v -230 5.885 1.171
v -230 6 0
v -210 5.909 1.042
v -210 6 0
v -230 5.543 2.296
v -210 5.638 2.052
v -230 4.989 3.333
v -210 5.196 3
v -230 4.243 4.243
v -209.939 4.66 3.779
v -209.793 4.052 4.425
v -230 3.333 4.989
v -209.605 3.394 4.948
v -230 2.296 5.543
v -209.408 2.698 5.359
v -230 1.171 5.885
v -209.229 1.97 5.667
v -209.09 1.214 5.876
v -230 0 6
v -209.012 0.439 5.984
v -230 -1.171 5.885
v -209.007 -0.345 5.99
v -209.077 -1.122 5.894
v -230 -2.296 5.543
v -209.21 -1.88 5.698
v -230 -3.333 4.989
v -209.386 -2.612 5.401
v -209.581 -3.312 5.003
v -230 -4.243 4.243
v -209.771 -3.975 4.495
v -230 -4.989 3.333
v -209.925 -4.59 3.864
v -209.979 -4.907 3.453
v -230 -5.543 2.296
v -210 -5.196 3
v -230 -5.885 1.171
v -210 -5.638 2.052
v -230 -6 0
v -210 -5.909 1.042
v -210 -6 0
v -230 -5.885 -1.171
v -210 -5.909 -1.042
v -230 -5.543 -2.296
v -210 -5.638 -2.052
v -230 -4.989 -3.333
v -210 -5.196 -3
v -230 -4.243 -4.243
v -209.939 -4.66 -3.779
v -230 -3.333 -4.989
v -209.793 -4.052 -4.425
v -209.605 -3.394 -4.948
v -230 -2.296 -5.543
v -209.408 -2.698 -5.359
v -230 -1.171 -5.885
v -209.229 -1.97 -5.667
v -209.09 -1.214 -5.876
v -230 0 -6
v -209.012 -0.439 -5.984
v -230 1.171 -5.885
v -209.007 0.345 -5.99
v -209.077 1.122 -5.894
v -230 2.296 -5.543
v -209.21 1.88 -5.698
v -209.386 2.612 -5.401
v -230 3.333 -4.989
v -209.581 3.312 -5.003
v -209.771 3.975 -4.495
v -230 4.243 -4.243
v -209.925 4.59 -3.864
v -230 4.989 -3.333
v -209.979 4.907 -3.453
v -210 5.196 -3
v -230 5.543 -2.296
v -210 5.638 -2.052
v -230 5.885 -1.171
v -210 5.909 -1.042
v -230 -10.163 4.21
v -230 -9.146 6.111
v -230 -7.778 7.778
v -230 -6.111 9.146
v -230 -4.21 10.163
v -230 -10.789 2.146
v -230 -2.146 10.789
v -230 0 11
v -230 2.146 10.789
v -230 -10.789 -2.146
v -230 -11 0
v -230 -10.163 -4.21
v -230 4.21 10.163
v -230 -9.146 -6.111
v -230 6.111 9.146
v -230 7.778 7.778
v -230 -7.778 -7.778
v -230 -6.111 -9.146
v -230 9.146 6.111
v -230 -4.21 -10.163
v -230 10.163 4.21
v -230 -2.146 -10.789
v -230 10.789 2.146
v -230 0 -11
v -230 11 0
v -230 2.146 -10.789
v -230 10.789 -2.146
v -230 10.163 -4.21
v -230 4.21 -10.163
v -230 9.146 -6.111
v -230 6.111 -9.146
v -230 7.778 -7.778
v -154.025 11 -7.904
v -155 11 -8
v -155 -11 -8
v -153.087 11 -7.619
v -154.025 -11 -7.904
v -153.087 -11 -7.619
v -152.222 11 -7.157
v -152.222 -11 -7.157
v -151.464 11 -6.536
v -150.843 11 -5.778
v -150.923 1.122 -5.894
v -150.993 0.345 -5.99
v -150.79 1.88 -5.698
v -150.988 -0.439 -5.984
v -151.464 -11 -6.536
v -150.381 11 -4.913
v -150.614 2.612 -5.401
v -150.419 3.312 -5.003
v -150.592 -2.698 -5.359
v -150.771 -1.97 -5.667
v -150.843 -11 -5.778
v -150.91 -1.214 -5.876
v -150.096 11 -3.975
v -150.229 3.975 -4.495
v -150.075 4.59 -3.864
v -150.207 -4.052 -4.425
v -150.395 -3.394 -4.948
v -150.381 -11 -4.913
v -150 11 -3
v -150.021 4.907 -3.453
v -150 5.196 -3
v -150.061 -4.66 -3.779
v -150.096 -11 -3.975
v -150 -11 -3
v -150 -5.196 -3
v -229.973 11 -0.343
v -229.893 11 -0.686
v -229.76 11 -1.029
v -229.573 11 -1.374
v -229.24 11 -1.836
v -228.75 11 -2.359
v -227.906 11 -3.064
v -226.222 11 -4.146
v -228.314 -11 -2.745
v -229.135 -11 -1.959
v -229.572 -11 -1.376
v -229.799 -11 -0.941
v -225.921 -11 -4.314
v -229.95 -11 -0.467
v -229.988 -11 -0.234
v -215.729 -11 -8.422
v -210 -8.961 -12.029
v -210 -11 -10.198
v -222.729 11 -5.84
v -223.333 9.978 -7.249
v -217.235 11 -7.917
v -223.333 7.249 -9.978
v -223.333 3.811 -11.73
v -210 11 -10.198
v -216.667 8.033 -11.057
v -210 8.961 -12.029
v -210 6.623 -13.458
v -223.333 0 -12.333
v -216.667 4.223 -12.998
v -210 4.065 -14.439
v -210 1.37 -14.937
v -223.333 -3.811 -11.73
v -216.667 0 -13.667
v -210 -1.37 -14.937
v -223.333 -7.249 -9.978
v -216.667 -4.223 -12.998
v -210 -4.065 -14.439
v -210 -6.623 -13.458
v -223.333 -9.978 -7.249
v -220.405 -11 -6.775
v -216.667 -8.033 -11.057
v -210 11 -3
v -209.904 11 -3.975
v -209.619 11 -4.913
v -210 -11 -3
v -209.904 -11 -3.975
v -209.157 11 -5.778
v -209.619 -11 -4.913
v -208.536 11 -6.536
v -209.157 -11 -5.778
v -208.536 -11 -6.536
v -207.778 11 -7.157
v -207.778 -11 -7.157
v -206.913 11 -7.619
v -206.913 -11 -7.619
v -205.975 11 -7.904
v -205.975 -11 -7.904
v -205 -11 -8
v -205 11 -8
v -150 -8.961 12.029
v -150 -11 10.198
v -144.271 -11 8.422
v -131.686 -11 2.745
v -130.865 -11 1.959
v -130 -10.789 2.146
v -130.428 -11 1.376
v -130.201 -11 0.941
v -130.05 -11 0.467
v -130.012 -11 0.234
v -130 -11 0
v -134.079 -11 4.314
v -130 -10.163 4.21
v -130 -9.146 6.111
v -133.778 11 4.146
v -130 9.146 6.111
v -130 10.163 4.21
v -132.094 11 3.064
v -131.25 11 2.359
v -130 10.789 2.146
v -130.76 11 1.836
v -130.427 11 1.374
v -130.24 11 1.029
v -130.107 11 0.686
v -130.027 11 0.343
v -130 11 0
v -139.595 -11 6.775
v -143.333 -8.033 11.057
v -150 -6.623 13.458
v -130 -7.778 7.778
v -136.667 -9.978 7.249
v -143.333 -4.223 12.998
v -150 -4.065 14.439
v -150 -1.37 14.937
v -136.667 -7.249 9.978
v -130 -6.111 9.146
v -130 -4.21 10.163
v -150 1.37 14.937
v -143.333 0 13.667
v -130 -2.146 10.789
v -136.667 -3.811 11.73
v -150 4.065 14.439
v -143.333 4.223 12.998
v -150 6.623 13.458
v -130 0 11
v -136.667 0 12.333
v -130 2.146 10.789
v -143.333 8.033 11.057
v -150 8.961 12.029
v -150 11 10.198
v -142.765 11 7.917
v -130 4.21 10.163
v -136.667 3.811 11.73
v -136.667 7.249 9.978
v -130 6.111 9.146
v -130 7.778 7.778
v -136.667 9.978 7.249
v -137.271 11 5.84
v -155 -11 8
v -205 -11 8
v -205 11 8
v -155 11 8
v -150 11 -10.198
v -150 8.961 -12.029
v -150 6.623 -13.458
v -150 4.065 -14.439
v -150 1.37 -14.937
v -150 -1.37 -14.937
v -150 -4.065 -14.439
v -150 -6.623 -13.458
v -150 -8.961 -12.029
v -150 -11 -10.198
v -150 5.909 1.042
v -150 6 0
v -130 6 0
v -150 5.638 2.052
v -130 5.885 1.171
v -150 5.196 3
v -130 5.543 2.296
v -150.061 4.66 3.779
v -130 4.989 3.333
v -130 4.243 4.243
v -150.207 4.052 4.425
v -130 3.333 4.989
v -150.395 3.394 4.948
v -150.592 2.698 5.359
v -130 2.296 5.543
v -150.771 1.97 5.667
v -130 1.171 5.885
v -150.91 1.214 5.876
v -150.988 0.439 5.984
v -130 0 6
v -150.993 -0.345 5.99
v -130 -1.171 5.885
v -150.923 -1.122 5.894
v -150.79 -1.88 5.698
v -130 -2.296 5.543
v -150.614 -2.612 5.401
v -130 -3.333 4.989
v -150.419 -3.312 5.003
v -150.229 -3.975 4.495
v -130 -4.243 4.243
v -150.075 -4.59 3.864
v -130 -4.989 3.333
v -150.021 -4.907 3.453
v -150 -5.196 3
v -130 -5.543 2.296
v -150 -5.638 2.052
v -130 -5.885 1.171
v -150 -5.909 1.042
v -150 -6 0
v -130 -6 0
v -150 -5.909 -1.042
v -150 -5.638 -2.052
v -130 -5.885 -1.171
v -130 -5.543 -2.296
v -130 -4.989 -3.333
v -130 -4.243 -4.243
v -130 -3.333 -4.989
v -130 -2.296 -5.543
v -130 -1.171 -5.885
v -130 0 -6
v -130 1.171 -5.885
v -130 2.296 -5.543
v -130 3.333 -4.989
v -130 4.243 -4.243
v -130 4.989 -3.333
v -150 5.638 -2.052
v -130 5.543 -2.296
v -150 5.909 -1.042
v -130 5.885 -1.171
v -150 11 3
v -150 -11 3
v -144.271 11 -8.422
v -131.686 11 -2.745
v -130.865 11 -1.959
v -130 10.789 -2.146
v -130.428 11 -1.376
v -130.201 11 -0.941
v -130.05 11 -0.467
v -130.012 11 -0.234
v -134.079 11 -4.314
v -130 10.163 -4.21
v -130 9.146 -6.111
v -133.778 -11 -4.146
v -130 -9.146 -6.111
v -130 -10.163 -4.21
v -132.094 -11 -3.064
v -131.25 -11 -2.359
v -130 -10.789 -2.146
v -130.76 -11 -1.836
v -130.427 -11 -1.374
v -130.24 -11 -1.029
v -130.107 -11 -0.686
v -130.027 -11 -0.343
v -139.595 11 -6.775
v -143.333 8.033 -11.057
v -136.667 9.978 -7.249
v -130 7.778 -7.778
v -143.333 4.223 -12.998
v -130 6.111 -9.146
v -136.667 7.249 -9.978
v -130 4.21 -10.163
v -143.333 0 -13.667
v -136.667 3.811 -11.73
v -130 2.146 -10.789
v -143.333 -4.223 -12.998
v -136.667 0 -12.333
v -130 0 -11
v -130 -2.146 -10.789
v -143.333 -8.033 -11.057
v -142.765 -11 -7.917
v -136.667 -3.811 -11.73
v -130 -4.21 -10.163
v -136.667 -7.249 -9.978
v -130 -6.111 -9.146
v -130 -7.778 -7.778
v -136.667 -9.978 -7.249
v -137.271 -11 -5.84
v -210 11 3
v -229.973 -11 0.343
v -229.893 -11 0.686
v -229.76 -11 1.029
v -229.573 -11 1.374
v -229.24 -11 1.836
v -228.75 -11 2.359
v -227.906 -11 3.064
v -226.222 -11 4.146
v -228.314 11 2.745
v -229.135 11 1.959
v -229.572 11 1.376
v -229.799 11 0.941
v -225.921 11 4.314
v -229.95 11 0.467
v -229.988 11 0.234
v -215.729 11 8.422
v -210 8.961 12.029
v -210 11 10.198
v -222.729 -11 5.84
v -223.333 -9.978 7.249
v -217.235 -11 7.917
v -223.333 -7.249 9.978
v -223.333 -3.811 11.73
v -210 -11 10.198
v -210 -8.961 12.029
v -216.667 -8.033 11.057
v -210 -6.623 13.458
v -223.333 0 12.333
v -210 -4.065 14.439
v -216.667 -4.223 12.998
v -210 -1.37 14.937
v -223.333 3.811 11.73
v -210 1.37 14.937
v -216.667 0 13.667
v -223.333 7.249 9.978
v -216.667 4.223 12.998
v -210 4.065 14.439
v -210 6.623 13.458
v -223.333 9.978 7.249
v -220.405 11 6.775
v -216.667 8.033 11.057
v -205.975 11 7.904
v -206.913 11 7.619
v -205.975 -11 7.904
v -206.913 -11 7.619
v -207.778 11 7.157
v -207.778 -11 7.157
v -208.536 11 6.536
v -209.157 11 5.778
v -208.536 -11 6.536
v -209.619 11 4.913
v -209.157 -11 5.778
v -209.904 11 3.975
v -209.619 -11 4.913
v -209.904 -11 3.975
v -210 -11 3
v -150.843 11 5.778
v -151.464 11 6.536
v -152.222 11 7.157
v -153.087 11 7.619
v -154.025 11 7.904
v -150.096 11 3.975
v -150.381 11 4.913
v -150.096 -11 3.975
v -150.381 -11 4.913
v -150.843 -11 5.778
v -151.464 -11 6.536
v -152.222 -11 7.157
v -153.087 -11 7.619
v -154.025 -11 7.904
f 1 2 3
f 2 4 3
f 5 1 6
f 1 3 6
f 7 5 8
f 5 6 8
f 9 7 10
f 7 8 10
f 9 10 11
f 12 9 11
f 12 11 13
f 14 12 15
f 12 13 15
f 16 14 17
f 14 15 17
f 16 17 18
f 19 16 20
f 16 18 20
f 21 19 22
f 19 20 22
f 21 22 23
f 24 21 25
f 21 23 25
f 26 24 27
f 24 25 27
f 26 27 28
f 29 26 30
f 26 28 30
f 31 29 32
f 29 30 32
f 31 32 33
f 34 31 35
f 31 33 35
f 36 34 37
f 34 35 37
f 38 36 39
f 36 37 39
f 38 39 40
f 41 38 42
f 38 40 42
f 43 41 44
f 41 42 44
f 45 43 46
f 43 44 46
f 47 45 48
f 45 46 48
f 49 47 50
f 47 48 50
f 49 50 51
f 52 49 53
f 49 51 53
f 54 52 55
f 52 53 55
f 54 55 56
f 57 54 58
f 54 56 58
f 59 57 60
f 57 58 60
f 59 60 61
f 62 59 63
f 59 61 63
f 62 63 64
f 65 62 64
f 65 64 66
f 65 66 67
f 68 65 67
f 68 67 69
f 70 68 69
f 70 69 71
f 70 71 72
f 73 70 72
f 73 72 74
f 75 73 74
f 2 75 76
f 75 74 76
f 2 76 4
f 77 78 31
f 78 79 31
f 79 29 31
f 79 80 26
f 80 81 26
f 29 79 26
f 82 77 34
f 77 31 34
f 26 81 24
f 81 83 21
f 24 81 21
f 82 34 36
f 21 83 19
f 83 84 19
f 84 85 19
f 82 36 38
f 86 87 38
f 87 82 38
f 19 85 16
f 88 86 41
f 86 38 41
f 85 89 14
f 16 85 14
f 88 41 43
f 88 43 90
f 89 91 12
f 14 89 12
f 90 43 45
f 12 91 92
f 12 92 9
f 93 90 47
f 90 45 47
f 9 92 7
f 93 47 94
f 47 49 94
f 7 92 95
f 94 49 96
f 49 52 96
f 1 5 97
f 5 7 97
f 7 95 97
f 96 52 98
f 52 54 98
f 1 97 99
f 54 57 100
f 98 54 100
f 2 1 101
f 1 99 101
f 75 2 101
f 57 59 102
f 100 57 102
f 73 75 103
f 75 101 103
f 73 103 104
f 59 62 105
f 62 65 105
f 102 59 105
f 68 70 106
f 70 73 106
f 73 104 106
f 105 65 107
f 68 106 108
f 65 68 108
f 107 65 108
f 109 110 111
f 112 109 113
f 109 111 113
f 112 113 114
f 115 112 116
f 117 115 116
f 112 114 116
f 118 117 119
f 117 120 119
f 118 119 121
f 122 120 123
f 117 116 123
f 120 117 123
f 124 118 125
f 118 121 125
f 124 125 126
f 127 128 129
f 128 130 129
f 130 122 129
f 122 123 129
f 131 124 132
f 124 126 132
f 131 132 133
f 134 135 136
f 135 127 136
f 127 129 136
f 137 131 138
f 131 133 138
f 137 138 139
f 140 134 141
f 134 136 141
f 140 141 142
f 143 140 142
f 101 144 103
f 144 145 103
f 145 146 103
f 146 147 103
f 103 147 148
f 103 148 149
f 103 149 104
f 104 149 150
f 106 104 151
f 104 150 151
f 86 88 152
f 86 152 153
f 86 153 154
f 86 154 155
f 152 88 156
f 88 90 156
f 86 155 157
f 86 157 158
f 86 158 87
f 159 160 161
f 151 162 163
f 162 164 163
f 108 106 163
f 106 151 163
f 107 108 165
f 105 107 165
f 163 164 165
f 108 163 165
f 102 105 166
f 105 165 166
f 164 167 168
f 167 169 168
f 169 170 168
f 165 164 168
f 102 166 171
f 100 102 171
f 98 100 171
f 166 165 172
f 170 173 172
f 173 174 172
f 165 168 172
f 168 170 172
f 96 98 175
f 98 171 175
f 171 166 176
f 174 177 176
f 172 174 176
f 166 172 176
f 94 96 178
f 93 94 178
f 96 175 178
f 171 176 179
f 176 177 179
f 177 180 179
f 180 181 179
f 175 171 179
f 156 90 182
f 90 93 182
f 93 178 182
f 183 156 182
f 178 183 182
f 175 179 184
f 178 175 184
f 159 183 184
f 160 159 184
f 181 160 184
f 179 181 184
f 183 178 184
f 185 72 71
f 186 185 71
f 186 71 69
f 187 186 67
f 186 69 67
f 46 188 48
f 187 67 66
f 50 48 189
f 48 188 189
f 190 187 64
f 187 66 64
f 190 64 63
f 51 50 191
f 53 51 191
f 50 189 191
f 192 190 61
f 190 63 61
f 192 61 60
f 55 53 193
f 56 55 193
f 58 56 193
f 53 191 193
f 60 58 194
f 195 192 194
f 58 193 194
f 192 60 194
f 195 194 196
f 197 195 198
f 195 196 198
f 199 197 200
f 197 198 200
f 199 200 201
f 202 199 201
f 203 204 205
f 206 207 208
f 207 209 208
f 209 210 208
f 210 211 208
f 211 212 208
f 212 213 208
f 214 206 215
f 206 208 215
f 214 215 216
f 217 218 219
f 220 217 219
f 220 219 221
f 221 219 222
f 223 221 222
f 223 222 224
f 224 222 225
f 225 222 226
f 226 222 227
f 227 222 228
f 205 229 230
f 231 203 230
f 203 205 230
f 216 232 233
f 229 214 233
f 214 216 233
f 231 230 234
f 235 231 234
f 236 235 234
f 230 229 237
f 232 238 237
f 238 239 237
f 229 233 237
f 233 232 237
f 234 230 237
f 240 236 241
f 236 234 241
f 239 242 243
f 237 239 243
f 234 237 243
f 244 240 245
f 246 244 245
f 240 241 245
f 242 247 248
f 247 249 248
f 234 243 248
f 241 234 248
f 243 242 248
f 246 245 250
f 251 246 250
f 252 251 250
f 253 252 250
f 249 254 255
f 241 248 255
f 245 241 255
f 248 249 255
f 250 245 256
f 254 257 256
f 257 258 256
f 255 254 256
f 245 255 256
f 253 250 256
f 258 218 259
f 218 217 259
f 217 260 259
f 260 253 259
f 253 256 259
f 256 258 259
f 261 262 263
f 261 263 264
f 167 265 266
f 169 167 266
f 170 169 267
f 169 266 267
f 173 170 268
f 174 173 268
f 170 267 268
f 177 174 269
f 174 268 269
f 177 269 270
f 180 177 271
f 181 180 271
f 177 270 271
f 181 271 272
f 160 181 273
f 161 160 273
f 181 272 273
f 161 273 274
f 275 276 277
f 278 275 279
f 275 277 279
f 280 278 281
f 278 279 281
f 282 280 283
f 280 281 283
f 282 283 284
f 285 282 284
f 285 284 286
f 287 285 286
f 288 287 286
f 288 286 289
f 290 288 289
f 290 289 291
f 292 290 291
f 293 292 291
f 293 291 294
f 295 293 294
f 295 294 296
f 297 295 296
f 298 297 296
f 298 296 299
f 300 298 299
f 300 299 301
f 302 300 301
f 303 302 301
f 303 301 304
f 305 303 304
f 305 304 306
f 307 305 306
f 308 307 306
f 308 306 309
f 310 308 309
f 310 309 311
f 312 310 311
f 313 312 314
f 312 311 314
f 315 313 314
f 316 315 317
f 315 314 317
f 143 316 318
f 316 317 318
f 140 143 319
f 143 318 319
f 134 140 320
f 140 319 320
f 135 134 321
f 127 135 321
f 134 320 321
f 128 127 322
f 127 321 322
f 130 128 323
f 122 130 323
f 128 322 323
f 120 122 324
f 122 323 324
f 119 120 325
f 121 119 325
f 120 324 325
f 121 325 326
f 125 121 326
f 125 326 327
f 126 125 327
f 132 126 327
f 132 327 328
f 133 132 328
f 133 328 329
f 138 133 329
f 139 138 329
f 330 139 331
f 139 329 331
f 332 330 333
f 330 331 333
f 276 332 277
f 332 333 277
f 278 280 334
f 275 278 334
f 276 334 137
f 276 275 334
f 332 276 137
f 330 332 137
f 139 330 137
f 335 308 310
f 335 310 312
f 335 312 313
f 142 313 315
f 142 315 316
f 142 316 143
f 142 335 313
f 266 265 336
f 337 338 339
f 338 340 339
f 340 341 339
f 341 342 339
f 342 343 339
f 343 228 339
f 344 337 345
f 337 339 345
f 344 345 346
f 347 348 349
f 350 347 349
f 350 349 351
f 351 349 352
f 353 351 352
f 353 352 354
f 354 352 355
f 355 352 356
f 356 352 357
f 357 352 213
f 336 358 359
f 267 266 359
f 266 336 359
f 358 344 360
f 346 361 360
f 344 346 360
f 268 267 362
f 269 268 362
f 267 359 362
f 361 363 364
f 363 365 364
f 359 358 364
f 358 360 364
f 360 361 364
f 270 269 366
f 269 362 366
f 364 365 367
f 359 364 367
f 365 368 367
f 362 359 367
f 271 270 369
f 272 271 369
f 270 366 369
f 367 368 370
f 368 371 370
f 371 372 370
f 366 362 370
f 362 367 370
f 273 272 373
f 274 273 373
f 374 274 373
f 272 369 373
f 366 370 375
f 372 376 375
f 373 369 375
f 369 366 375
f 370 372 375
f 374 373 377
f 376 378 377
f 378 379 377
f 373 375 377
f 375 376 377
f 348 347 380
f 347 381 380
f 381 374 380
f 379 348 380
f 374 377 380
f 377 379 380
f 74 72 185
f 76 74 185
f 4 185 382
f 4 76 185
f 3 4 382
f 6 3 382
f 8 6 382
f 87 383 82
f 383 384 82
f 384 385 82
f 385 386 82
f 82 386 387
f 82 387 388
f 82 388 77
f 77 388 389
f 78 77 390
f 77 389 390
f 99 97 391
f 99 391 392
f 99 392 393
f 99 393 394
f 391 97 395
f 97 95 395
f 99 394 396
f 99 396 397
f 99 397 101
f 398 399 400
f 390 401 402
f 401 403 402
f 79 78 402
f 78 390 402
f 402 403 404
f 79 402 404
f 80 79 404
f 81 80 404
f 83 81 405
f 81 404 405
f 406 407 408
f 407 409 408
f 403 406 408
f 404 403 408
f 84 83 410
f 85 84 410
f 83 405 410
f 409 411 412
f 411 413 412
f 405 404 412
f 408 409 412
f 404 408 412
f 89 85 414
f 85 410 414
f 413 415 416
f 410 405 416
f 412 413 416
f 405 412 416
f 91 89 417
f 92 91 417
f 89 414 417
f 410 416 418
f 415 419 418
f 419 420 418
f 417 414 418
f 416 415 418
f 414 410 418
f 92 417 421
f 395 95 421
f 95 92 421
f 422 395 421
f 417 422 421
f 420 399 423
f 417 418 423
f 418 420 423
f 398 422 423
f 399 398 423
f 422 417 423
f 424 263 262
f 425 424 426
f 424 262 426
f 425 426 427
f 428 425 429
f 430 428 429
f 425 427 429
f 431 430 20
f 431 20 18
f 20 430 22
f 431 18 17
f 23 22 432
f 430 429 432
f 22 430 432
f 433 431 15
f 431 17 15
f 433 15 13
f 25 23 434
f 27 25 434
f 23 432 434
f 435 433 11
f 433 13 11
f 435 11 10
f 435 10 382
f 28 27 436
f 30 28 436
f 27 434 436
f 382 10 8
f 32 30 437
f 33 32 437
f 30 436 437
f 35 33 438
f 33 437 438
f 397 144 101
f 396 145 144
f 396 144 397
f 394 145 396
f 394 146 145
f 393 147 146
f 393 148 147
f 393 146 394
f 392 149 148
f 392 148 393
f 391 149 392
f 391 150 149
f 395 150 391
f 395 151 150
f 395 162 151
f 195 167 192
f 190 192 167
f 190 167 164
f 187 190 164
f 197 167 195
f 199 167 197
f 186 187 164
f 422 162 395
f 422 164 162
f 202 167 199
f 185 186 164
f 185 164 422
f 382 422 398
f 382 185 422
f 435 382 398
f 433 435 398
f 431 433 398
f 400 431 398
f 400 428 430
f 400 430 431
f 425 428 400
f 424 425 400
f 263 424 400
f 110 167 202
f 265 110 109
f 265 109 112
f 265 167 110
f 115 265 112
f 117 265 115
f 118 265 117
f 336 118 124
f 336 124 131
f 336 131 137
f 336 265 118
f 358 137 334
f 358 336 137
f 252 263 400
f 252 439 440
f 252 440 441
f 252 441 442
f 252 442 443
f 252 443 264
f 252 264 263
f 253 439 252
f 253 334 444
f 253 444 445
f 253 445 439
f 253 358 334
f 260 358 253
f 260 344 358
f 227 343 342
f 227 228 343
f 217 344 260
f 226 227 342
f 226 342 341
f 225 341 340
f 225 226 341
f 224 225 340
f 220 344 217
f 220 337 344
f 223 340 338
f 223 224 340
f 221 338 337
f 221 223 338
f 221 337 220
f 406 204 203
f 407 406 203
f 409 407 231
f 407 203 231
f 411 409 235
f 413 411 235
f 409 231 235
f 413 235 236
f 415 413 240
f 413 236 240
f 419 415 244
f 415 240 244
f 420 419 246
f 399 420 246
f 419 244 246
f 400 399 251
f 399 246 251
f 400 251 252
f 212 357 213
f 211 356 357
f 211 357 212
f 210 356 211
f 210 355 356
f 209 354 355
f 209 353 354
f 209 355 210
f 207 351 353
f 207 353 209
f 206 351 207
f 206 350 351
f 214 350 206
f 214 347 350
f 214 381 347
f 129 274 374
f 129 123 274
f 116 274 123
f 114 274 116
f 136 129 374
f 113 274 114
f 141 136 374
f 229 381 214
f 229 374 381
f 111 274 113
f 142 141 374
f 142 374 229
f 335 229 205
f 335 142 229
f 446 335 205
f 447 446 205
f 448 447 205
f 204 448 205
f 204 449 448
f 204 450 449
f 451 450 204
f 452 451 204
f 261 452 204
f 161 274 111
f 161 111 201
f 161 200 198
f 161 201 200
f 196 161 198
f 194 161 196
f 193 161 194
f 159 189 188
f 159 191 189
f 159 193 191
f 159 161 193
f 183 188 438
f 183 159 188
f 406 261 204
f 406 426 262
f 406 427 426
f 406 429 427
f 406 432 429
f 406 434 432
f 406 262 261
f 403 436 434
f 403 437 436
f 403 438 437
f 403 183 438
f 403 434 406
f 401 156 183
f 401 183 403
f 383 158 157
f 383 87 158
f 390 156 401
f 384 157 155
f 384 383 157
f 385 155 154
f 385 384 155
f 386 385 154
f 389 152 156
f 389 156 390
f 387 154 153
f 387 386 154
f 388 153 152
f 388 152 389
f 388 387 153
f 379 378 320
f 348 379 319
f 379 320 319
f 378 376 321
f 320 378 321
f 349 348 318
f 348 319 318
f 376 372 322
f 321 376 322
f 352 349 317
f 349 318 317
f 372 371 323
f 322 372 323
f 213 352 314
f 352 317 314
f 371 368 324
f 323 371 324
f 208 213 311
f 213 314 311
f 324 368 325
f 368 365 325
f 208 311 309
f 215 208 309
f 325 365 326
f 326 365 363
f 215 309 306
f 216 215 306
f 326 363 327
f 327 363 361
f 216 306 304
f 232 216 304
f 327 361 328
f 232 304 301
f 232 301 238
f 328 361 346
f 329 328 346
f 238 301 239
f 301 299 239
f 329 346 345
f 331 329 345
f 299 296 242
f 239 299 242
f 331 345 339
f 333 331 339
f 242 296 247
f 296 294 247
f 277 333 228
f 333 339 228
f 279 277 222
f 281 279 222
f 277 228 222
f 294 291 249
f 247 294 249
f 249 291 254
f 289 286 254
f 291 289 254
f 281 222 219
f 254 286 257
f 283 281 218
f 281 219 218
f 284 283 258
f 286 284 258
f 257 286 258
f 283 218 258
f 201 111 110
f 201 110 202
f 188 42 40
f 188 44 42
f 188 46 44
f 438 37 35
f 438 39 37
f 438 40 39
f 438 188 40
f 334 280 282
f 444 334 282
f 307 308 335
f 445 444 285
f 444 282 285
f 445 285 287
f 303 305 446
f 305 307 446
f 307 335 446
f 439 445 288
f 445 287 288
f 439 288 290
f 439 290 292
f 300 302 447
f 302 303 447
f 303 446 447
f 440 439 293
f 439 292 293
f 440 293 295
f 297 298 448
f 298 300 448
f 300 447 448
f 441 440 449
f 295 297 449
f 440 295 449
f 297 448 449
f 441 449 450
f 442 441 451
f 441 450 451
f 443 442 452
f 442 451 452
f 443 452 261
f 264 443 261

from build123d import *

# Parameters (mm, degrees)
SKETCH024_R      = 6
EXTRUDE011_DEPTH = 150
EXTRUDE010_DEPTH = 30
SKETCH022_W      = 15
SKETCH022_H      = 79.05159
SKETCH022_H_2    = 80
EXTRUDE009_DEPTH = 150


with BuildPart() as extrude011:
    # Sketch024 → Extrude011 (new body, symmetric)
    with BuildSketch(Plane.YZ):
        Circle(SKETCH024_R)
    extrude(amount=EXTRUDE011_DEPTH, both=True)


with BuildPart() as extrude022:
    # Sketch023 → Extrude010 (new body, symmetric)
    with BuildSketch(Plane.XZ):
        with BuildLine():
            Line((30, 3), (30, -3))
            ThreePointArc((25, -8), (28.535534, -6.535534), (30, -3))
            Line((25, -8), (-25, -8))
            ThreePointArc((-30, -3), (-28.535534, -6.535534), (-25, -8))
            Line((-30, -3), (-30, 3))
            ThreePointArc((-25, 8), (-28.535534, 6.535534), (-30, 3))
            Line((-25, 8), (25, 8))
            ThreePointArc((30, 3), (28.535534, 6.535534), (25, 8))
        make_face()
    extrude(amount=EXTRUDE010_DEPTH, both=True)


with BuildPart() as extrude021:
    # Sketch022 → Extrude009 (new body, symmetric)
    with BuildSketch(Plane.YZ):
        with Locations((-18.5, 0.159191)):
            Rectangle(SKETCH022_W, SKETCH022_H)
        with Locations((18.5, -0.315014)):
            Rectangle(SKETCH022_W, SKETCH022_H_2)
    extrude(amount=EXTRUDE009_DEPTH, both=True)


with BuildPart() as turnbackle001:
    # Sketch021 → Revolve001 (revolve)
    with BuildSketch(Plane.XZ):
        Polygon((-50, 0), (-50, 11), (-30, 15), (30, 15), (50, 11), (50, 0), align=None)
    revolve(axis=Axis((-50, 0, 0), (-1, 0, 0)))

    # Cut009: cut Extrude021
    add(extrude021.part, mode=Mode.SUBTRACT)

    # Cut010: cut Extrude022
    add(extrude022.part, mode=Mode.SUBTRACT)

    # Cut011: cut Extrude011
    add(extrude011.part, mode=Mode.SUBTRACT)


with BuildPart() as turnbackle001_1:
    # Cut011 placement: moved
    add(turnbackle001.part.moved(Location((-180, 0, 0))))


solid = turnbackle001_1.part
